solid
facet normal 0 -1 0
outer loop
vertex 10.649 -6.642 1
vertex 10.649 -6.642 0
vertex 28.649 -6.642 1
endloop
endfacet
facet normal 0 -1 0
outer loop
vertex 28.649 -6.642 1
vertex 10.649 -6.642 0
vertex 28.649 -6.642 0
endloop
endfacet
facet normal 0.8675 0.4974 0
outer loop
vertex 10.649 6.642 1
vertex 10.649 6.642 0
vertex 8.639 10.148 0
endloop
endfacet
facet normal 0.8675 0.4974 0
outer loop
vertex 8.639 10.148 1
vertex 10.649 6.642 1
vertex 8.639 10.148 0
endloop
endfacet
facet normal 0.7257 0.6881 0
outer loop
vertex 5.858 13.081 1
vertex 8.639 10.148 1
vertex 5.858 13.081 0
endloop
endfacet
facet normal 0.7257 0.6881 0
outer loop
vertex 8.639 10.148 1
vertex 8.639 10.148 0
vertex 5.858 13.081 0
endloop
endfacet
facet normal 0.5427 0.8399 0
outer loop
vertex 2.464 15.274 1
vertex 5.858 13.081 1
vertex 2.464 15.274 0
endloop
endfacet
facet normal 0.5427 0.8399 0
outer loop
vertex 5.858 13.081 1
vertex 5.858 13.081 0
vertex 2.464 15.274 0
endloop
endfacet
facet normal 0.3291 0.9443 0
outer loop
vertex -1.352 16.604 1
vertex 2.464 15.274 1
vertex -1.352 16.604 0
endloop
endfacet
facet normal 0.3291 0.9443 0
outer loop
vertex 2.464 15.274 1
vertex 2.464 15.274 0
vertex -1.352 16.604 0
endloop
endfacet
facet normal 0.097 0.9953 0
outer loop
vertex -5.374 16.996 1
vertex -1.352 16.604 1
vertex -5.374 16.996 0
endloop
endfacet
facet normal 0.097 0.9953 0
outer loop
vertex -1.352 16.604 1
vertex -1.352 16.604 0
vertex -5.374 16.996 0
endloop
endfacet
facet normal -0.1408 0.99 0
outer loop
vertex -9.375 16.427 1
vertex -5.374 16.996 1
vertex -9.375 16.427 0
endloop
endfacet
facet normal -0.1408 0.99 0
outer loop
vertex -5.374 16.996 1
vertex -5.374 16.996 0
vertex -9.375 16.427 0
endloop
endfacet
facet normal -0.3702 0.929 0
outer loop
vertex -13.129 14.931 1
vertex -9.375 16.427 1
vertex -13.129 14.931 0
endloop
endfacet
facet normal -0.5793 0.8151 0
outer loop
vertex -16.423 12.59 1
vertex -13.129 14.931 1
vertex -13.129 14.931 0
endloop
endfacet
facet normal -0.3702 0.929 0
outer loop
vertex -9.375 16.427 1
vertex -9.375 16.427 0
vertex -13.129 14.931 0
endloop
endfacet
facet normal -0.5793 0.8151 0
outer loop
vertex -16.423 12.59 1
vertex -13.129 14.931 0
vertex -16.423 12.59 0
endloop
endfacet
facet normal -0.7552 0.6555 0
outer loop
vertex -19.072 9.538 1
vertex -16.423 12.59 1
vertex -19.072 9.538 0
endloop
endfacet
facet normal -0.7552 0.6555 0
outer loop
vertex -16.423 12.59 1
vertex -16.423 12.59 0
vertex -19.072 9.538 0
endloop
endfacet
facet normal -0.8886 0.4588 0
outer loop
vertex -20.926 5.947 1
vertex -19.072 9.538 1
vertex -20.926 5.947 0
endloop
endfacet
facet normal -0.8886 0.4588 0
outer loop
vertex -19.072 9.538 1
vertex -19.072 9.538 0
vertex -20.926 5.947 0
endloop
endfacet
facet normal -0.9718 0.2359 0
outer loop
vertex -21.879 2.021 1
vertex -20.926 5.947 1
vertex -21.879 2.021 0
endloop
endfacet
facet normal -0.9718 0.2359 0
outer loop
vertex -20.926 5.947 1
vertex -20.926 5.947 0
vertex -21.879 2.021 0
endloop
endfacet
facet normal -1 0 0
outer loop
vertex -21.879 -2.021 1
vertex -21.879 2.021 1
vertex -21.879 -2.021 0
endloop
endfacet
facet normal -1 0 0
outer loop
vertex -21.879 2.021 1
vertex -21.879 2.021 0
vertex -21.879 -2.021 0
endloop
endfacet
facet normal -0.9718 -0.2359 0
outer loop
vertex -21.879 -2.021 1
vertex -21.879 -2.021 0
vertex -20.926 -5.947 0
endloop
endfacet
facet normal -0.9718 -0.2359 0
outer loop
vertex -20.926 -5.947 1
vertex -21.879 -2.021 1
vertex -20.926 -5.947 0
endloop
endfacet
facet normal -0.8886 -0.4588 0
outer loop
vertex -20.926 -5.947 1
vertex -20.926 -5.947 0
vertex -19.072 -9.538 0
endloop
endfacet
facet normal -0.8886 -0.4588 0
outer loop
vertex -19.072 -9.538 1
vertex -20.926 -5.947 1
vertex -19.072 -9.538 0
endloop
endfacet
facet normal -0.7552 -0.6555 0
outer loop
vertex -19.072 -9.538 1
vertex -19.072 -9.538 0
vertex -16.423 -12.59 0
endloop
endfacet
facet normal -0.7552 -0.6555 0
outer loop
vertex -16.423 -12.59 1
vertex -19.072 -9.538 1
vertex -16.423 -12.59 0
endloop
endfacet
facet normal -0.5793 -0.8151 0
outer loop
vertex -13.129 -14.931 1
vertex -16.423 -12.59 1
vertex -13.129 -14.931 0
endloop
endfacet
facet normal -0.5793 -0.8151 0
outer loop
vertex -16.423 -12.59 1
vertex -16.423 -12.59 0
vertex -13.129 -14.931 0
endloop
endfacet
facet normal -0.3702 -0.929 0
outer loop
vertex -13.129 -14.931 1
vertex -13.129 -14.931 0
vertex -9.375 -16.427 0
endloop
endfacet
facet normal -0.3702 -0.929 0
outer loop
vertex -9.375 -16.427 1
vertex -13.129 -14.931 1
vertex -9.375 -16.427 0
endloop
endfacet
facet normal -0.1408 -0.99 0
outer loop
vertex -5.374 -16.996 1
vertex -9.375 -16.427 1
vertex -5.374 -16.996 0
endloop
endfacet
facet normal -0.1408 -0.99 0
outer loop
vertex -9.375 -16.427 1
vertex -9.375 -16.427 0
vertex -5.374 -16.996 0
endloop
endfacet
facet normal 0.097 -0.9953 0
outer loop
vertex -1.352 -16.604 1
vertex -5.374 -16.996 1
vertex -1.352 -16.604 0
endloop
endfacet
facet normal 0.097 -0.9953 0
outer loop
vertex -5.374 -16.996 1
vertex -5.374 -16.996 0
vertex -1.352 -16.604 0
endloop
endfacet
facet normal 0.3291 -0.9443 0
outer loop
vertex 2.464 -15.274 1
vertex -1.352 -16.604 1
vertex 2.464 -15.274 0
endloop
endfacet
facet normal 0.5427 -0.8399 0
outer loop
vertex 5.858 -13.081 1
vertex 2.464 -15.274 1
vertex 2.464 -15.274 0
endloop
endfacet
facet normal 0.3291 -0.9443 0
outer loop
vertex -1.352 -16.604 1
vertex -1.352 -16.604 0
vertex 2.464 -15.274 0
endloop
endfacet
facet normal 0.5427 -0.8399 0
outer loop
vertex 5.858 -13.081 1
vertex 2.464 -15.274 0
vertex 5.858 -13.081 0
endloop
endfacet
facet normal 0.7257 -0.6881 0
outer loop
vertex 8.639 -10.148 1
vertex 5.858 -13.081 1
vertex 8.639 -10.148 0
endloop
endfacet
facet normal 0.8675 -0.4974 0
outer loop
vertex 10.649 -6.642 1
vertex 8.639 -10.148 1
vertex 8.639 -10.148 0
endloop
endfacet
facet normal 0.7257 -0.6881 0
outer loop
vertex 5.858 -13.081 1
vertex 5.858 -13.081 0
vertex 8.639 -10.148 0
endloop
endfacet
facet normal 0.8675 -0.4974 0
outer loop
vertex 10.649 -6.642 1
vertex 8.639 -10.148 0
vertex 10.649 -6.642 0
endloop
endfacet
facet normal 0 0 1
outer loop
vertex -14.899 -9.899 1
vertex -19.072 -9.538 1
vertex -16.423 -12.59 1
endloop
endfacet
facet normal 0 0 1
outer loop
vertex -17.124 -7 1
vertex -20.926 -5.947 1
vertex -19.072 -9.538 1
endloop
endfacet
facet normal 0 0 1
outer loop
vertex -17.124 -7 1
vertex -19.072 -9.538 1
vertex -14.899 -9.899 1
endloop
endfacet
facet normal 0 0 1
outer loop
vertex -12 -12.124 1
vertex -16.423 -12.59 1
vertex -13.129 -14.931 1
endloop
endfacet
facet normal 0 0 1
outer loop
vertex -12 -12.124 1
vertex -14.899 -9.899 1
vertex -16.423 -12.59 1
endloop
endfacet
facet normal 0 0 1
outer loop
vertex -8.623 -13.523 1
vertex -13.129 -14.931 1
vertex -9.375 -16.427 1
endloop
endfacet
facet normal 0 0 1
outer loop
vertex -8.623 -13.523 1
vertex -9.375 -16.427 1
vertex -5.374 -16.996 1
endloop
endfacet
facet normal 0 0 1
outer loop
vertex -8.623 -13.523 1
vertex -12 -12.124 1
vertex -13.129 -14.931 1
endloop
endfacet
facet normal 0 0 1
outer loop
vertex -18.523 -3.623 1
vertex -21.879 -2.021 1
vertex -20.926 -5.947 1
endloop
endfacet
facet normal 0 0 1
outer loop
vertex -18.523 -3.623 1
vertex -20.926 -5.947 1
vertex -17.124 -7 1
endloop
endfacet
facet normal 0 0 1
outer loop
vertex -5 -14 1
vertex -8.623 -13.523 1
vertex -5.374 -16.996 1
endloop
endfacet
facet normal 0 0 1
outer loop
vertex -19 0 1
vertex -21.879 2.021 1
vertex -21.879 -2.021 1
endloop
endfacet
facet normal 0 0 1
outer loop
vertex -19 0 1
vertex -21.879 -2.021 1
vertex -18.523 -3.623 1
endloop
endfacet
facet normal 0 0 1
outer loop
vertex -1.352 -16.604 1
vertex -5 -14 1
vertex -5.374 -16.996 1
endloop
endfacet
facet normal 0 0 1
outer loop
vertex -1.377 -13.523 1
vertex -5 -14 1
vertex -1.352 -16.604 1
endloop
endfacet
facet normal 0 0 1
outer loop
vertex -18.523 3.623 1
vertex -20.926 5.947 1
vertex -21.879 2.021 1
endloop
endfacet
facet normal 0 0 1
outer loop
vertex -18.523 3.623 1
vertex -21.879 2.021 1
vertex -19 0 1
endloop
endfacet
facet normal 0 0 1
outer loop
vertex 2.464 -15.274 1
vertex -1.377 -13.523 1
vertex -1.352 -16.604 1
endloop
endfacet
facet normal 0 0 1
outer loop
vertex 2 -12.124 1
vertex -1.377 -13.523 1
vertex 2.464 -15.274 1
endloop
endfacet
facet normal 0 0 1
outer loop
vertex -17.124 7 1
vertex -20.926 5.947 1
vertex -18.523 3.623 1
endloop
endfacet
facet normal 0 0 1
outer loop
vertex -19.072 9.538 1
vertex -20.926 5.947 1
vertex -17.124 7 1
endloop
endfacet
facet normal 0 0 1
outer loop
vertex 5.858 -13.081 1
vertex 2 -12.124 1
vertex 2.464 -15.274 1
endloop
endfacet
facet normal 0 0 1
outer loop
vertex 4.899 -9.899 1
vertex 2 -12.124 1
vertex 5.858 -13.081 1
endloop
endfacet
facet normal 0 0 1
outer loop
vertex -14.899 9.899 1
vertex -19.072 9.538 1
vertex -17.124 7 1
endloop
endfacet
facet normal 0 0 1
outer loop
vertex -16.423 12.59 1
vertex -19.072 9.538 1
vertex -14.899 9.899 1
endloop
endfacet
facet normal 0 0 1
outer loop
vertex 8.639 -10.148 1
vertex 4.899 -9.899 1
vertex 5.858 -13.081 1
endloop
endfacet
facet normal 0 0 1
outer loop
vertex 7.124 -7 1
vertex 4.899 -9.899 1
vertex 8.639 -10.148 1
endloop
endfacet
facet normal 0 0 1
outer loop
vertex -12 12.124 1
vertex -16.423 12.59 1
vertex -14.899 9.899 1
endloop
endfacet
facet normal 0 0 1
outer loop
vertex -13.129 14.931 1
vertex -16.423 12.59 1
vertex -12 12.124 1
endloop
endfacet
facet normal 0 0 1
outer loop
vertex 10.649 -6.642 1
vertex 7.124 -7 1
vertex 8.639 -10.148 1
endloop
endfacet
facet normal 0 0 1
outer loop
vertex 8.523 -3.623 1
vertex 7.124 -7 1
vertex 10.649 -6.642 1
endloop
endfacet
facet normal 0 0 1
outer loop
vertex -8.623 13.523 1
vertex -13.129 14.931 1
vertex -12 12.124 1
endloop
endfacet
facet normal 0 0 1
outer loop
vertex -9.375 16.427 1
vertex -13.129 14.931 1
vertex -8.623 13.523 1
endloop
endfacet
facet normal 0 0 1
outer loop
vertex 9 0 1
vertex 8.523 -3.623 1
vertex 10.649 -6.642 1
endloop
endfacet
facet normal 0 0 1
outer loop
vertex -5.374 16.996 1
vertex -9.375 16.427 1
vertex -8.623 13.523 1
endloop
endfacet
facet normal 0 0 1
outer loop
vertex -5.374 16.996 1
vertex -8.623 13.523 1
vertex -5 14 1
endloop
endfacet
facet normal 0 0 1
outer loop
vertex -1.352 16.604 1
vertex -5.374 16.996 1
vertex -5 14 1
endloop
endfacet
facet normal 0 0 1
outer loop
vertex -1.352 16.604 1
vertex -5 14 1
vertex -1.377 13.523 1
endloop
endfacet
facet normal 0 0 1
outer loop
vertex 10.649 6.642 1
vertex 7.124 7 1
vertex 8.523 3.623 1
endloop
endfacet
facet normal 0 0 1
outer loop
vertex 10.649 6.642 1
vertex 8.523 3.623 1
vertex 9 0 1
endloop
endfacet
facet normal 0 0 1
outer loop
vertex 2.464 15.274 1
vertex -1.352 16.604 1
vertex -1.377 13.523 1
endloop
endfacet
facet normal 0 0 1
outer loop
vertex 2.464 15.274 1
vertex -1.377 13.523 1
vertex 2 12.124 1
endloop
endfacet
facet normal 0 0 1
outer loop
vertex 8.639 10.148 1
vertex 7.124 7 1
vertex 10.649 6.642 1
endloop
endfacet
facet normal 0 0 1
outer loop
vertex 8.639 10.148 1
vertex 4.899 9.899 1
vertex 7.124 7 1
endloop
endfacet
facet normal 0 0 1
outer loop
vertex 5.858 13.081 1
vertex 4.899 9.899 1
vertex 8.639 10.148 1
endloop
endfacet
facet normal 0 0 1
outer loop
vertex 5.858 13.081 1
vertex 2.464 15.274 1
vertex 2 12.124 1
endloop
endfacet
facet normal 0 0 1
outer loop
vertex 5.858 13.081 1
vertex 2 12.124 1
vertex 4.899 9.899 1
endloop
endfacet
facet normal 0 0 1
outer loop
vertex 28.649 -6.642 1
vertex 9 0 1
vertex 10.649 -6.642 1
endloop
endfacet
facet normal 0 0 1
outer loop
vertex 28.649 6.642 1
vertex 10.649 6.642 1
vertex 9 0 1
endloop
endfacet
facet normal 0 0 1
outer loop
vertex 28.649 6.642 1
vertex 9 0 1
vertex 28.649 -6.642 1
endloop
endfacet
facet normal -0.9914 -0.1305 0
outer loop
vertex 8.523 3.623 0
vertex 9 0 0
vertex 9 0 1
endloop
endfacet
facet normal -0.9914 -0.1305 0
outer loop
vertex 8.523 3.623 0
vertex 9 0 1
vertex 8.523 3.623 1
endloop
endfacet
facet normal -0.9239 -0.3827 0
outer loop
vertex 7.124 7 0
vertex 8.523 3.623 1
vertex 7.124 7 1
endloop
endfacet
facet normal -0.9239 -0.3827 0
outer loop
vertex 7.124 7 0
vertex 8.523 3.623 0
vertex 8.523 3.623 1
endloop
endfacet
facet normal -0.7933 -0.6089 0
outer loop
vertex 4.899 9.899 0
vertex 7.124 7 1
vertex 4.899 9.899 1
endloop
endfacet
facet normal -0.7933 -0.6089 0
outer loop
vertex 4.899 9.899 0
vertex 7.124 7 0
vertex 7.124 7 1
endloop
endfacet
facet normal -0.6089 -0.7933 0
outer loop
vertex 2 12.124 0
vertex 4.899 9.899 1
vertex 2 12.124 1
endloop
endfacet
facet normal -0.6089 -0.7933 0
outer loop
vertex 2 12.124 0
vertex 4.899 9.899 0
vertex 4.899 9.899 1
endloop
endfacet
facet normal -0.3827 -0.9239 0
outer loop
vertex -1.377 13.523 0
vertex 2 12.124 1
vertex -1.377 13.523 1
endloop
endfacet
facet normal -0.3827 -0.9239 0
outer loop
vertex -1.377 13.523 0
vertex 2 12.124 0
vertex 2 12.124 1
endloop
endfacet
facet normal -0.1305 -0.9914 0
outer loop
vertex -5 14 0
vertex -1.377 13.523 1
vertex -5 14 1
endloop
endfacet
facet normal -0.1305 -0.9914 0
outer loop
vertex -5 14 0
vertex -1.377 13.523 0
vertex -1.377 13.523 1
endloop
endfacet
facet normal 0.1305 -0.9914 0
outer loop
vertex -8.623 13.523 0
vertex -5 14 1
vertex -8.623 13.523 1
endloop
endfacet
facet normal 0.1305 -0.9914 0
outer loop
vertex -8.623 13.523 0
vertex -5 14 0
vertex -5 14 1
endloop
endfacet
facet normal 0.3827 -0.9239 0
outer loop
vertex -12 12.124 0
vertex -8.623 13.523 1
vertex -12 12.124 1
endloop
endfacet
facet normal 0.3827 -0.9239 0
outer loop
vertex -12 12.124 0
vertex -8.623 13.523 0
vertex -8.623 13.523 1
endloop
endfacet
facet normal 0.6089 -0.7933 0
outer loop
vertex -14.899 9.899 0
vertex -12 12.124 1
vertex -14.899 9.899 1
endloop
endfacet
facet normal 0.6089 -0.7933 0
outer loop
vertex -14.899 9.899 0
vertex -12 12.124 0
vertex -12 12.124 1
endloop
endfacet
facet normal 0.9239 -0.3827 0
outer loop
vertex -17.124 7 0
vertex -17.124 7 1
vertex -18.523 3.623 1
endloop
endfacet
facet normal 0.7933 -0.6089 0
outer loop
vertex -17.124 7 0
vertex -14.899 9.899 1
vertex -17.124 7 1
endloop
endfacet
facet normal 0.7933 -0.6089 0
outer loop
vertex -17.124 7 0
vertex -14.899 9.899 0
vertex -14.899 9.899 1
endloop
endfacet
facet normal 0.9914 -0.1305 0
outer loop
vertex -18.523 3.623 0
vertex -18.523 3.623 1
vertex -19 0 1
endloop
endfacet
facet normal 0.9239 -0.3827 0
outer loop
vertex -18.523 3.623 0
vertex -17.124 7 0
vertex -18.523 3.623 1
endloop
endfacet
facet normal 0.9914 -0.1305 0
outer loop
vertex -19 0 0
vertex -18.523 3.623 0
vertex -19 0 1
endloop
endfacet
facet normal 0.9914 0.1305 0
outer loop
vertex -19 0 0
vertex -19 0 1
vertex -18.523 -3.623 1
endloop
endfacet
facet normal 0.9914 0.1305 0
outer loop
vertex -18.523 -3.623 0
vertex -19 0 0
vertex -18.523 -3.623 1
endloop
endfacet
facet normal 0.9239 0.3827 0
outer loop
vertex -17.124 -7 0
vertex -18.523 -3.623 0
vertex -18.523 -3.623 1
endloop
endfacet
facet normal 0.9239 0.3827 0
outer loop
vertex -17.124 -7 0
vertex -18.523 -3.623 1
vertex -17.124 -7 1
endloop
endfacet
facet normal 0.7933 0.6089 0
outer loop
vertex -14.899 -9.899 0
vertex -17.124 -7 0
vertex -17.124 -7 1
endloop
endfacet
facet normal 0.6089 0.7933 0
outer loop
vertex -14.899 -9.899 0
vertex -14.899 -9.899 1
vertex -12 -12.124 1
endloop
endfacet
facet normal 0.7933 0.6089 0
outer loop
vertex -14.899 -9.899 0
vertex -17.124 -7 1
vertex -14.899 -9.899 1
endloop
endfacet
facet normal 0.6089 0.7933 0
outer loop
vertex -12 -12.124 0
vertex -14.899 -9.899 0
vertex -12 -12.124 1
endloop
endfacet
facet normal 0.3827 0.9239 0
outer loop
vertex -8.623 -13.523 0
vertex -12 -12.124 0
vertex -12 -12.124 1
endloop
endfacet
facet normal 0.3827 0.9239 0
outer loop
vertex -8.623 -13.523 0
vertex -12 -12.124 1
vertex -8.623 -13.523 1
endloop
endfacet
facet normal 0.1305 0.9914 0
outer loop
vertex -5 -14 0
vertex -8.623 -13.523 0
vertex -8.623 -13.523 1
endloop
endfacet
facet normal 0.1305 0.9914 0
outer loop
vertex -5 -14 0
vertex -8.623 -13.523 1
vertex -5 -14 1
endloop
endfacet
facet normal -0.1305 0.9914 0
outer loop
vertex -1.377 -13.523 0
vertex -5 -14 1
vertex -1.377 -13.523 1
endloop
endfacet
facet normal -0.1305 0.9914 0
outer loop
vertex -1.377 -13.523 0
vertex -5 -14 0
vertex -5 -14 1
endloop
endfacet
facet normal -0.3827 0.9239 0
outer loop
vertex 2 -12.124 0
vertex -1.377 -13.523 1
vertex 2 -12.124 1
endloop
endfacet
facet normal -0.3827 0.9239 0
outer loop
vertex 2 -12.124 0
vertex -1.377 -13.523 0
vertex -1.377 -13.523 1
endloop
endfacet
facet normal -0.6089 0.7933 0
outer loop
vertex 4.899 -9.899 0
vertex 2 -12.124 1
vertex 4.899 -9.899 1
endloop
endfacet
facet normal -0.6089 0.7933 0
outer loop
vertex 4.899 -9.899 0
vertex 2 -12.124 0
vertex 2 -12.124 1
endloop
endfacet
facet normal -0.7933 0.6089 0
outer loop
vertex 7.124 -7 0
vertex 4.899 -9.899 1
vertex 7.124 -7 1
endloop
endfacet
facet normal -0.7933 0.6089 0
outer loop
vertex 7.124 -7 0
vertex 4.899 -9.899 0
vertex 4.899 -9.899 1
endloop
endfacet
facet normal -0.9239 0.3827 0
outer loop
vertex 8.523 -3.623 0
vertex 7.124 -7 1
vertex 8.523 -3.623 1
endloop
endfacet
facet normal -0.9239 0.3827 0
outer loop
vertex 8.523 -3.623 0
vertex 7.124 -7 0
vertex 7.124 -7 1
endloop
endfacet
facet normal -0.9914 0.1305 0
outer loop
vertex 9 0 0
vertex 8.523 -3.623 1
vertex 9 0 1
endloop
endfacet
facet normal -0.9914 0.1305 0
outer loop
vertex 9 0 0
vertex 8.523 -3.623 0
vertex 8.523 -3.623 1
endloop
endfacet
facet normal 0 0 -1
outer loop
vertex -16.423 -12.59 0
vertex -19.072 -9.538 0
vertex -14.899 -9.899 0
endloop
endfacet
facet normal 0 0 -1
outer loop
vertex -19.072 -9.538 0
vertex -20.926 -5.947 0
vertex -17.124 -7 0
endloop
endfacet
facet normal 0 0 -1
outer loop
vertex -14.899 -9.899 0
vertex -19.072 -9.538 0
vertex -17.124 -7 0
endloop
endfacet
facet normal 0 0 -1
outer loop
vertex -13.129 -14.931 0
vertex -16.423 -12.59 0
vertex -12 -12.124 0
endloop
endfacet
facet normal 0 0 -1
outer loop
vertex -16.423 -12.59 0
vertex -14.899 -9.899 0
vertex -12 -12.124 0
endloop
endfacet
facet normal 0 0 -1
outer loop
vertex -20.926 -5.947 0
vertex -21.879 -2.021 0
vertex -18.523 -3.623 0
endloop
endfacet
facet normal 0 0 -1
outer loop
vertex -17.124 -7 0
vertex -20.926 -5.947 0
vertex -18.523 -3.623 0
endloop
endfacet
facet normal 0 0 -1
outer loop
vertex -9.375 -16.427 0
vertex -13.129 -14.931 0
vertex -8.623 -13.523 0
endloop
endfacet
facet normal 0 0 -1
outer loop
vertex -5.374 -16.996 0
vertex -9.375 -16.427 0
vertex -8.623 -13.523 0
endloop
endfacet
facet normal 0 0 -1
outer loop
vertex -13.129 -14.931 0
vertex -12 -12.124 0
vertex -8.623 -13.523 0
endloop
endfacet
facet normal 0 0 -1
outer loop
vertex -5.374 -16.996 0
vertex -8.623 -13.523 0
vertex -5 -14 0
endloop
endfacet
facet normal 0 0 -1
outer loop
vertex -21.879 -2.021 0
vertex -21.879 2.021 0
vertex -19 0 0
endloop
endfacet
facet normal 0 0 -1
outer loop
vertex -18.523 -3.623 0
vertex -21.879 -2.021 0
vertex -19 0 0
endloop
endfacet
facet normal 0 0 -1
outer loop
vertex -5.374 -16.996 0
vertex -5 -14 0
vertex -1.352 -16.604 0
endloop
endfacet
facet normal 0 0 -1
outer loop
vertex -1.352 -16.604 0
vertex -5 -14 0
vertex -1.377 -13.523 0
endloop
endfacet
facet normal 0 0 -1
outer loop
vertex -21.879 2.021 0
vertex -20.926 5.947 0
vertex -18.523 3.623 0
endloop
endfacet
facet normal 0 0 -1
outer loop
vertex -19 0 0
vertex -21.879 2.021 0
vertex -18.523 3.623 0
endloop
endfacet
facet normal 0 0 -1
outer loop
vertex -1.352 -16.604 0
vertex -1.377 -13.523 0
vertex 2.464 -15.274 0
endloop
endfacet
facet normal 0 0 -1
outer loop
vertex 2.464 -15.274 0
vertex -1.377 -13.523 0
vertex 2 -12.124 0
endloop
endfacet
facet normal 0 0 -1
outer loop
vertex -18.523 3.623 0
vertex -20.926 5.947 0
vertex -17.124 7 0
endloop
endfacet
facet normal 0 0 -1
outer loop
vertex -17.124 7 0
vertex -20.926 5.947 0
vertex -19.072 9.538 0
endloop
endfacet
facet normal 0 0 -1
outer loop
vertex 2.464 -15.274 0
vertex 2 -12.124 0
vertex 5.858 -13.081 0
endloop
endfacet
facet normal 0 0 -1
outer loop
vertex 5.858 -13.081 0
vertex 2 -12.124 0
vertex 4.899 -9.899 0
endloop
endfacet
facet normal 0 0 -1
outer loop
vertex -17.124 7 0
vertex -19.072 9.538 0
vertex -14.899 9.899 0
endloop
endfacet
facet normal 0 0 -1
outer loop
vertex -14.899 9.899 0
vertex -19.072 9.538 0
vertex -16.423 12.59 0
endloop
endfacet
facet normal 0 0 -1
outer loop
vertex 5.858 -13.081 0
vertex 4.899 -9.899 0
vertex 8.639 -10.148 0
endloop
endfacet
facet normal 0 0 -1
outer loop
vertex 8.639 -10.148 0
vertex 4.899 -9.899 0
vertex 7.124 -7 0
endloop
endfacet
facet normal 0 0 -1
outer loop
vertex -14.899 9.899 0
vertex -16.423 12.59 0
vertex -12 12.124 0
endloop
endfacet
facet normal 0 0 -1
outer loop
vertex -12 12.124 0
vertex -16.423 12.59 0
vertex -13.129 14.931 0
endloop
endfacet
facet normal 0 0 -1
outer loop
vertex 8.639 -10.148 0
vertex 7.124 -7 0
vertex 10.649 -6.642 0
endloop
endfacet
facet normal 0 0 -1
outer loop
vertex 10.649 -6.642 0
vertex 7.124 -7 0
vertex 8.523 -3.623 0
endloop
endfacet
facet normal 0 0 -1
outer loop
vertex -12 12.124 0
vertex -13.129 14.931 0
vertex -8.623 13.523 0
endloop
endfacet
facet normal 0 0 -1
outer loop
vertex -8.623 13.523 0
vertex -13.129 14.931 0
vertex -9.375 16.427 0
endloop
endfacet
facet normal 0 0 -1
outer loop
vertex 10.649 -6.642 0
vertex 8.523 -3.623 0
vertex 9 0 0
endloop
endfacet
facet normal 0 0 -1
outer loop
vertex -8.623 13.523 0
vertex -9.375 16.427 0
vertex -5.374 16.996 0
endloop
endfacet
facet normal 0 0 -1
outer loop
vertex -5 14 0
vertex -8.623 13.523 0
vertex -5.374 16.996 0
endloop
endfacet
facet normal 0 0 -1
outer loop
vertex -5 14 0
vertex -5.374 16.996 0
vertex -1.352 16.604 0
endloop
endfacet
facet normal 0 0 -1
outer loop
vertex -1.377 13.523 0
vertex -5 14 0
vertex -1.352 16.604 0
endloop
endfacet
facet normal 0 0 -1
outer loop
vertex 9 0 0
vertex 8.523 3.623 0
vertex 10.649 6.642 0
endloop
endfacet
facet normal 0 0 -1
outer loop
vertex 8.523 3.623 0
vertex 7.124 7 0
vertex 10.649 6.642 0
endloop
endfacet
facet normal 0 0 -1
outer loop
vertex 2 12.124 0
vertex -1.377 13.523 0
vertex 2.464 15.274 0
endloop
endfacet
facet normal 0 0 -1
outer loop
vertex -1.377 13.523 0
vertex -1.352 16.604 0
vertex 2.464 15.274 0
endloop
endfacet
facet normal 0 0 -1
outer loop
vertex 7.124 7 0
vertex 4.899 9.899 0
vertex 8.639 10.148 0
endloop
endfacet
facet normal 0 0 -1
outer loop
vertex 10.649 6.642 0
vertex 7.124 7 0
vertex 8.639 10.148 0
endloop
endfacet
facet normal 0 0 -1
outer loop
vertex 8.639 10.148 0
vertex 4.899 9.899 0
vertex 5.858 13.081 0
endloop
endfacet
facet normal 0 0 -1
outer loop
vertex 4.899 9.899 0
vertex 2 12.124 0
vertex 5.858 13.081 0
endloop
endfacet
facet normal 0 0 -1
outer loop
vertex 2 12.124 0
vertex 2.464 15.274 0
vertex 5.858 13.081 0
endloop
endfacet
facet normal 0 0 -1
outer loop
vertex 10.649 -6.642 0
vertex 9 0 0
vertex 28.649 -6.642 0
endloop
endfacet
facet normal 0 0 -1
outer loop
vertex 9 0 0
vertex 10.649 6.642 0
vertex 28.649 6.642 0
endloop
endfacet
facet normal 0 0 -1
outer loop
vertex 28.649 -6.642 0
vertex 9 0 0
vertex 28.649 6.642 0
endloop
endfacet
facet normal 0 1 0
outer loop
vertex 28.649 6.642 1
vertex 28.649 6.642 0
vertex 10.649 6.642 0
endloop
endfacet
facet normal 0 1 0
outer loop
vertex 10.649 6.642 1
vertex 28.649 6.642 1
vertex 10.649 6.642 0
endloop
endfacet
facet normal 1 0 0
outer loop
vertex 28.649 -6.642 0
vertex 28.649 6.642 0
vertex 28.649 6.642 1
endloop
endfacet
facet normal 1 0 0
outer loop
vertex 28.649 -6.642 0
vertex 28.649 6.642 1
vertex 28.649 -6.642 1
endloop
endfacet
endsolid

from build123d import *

# Parameters (mm, degrees)
PAD_DEPTH    = 1
SKETCH_R     = 14
POCKET_DEPTH = 1.001


with BuildPart() as part:
    # Sketch004 → Pad (new body)
    with BuildSketch(Plane.XY):
        with BuildLine():
            Line((28.648583, 6.642429), (10.648583, 6.642429))
            ThreePointArc((10.648583, 6.642429), (-22, 0), (10.648583, -6.642429))
            Line((10.648583, -6.642429), (28.648583, -6.642429))
            Line((28.648583, 0), (28.648583, -6.642429))
            Line((28.648583, 6.642429), (28.648583, 0))
        make_face()
    extrude(amount=PAD_DEPTH)

    # Sketch → Pocket (cut, through all)
    with BuildSketch(Plane.XY):
        with Locations((-5, 0)):
            Circle(SKETCH_R)
    extrude(amount=POCKET_DEPTH, mode=Mode.SUBTRACT)


solid = part.part
